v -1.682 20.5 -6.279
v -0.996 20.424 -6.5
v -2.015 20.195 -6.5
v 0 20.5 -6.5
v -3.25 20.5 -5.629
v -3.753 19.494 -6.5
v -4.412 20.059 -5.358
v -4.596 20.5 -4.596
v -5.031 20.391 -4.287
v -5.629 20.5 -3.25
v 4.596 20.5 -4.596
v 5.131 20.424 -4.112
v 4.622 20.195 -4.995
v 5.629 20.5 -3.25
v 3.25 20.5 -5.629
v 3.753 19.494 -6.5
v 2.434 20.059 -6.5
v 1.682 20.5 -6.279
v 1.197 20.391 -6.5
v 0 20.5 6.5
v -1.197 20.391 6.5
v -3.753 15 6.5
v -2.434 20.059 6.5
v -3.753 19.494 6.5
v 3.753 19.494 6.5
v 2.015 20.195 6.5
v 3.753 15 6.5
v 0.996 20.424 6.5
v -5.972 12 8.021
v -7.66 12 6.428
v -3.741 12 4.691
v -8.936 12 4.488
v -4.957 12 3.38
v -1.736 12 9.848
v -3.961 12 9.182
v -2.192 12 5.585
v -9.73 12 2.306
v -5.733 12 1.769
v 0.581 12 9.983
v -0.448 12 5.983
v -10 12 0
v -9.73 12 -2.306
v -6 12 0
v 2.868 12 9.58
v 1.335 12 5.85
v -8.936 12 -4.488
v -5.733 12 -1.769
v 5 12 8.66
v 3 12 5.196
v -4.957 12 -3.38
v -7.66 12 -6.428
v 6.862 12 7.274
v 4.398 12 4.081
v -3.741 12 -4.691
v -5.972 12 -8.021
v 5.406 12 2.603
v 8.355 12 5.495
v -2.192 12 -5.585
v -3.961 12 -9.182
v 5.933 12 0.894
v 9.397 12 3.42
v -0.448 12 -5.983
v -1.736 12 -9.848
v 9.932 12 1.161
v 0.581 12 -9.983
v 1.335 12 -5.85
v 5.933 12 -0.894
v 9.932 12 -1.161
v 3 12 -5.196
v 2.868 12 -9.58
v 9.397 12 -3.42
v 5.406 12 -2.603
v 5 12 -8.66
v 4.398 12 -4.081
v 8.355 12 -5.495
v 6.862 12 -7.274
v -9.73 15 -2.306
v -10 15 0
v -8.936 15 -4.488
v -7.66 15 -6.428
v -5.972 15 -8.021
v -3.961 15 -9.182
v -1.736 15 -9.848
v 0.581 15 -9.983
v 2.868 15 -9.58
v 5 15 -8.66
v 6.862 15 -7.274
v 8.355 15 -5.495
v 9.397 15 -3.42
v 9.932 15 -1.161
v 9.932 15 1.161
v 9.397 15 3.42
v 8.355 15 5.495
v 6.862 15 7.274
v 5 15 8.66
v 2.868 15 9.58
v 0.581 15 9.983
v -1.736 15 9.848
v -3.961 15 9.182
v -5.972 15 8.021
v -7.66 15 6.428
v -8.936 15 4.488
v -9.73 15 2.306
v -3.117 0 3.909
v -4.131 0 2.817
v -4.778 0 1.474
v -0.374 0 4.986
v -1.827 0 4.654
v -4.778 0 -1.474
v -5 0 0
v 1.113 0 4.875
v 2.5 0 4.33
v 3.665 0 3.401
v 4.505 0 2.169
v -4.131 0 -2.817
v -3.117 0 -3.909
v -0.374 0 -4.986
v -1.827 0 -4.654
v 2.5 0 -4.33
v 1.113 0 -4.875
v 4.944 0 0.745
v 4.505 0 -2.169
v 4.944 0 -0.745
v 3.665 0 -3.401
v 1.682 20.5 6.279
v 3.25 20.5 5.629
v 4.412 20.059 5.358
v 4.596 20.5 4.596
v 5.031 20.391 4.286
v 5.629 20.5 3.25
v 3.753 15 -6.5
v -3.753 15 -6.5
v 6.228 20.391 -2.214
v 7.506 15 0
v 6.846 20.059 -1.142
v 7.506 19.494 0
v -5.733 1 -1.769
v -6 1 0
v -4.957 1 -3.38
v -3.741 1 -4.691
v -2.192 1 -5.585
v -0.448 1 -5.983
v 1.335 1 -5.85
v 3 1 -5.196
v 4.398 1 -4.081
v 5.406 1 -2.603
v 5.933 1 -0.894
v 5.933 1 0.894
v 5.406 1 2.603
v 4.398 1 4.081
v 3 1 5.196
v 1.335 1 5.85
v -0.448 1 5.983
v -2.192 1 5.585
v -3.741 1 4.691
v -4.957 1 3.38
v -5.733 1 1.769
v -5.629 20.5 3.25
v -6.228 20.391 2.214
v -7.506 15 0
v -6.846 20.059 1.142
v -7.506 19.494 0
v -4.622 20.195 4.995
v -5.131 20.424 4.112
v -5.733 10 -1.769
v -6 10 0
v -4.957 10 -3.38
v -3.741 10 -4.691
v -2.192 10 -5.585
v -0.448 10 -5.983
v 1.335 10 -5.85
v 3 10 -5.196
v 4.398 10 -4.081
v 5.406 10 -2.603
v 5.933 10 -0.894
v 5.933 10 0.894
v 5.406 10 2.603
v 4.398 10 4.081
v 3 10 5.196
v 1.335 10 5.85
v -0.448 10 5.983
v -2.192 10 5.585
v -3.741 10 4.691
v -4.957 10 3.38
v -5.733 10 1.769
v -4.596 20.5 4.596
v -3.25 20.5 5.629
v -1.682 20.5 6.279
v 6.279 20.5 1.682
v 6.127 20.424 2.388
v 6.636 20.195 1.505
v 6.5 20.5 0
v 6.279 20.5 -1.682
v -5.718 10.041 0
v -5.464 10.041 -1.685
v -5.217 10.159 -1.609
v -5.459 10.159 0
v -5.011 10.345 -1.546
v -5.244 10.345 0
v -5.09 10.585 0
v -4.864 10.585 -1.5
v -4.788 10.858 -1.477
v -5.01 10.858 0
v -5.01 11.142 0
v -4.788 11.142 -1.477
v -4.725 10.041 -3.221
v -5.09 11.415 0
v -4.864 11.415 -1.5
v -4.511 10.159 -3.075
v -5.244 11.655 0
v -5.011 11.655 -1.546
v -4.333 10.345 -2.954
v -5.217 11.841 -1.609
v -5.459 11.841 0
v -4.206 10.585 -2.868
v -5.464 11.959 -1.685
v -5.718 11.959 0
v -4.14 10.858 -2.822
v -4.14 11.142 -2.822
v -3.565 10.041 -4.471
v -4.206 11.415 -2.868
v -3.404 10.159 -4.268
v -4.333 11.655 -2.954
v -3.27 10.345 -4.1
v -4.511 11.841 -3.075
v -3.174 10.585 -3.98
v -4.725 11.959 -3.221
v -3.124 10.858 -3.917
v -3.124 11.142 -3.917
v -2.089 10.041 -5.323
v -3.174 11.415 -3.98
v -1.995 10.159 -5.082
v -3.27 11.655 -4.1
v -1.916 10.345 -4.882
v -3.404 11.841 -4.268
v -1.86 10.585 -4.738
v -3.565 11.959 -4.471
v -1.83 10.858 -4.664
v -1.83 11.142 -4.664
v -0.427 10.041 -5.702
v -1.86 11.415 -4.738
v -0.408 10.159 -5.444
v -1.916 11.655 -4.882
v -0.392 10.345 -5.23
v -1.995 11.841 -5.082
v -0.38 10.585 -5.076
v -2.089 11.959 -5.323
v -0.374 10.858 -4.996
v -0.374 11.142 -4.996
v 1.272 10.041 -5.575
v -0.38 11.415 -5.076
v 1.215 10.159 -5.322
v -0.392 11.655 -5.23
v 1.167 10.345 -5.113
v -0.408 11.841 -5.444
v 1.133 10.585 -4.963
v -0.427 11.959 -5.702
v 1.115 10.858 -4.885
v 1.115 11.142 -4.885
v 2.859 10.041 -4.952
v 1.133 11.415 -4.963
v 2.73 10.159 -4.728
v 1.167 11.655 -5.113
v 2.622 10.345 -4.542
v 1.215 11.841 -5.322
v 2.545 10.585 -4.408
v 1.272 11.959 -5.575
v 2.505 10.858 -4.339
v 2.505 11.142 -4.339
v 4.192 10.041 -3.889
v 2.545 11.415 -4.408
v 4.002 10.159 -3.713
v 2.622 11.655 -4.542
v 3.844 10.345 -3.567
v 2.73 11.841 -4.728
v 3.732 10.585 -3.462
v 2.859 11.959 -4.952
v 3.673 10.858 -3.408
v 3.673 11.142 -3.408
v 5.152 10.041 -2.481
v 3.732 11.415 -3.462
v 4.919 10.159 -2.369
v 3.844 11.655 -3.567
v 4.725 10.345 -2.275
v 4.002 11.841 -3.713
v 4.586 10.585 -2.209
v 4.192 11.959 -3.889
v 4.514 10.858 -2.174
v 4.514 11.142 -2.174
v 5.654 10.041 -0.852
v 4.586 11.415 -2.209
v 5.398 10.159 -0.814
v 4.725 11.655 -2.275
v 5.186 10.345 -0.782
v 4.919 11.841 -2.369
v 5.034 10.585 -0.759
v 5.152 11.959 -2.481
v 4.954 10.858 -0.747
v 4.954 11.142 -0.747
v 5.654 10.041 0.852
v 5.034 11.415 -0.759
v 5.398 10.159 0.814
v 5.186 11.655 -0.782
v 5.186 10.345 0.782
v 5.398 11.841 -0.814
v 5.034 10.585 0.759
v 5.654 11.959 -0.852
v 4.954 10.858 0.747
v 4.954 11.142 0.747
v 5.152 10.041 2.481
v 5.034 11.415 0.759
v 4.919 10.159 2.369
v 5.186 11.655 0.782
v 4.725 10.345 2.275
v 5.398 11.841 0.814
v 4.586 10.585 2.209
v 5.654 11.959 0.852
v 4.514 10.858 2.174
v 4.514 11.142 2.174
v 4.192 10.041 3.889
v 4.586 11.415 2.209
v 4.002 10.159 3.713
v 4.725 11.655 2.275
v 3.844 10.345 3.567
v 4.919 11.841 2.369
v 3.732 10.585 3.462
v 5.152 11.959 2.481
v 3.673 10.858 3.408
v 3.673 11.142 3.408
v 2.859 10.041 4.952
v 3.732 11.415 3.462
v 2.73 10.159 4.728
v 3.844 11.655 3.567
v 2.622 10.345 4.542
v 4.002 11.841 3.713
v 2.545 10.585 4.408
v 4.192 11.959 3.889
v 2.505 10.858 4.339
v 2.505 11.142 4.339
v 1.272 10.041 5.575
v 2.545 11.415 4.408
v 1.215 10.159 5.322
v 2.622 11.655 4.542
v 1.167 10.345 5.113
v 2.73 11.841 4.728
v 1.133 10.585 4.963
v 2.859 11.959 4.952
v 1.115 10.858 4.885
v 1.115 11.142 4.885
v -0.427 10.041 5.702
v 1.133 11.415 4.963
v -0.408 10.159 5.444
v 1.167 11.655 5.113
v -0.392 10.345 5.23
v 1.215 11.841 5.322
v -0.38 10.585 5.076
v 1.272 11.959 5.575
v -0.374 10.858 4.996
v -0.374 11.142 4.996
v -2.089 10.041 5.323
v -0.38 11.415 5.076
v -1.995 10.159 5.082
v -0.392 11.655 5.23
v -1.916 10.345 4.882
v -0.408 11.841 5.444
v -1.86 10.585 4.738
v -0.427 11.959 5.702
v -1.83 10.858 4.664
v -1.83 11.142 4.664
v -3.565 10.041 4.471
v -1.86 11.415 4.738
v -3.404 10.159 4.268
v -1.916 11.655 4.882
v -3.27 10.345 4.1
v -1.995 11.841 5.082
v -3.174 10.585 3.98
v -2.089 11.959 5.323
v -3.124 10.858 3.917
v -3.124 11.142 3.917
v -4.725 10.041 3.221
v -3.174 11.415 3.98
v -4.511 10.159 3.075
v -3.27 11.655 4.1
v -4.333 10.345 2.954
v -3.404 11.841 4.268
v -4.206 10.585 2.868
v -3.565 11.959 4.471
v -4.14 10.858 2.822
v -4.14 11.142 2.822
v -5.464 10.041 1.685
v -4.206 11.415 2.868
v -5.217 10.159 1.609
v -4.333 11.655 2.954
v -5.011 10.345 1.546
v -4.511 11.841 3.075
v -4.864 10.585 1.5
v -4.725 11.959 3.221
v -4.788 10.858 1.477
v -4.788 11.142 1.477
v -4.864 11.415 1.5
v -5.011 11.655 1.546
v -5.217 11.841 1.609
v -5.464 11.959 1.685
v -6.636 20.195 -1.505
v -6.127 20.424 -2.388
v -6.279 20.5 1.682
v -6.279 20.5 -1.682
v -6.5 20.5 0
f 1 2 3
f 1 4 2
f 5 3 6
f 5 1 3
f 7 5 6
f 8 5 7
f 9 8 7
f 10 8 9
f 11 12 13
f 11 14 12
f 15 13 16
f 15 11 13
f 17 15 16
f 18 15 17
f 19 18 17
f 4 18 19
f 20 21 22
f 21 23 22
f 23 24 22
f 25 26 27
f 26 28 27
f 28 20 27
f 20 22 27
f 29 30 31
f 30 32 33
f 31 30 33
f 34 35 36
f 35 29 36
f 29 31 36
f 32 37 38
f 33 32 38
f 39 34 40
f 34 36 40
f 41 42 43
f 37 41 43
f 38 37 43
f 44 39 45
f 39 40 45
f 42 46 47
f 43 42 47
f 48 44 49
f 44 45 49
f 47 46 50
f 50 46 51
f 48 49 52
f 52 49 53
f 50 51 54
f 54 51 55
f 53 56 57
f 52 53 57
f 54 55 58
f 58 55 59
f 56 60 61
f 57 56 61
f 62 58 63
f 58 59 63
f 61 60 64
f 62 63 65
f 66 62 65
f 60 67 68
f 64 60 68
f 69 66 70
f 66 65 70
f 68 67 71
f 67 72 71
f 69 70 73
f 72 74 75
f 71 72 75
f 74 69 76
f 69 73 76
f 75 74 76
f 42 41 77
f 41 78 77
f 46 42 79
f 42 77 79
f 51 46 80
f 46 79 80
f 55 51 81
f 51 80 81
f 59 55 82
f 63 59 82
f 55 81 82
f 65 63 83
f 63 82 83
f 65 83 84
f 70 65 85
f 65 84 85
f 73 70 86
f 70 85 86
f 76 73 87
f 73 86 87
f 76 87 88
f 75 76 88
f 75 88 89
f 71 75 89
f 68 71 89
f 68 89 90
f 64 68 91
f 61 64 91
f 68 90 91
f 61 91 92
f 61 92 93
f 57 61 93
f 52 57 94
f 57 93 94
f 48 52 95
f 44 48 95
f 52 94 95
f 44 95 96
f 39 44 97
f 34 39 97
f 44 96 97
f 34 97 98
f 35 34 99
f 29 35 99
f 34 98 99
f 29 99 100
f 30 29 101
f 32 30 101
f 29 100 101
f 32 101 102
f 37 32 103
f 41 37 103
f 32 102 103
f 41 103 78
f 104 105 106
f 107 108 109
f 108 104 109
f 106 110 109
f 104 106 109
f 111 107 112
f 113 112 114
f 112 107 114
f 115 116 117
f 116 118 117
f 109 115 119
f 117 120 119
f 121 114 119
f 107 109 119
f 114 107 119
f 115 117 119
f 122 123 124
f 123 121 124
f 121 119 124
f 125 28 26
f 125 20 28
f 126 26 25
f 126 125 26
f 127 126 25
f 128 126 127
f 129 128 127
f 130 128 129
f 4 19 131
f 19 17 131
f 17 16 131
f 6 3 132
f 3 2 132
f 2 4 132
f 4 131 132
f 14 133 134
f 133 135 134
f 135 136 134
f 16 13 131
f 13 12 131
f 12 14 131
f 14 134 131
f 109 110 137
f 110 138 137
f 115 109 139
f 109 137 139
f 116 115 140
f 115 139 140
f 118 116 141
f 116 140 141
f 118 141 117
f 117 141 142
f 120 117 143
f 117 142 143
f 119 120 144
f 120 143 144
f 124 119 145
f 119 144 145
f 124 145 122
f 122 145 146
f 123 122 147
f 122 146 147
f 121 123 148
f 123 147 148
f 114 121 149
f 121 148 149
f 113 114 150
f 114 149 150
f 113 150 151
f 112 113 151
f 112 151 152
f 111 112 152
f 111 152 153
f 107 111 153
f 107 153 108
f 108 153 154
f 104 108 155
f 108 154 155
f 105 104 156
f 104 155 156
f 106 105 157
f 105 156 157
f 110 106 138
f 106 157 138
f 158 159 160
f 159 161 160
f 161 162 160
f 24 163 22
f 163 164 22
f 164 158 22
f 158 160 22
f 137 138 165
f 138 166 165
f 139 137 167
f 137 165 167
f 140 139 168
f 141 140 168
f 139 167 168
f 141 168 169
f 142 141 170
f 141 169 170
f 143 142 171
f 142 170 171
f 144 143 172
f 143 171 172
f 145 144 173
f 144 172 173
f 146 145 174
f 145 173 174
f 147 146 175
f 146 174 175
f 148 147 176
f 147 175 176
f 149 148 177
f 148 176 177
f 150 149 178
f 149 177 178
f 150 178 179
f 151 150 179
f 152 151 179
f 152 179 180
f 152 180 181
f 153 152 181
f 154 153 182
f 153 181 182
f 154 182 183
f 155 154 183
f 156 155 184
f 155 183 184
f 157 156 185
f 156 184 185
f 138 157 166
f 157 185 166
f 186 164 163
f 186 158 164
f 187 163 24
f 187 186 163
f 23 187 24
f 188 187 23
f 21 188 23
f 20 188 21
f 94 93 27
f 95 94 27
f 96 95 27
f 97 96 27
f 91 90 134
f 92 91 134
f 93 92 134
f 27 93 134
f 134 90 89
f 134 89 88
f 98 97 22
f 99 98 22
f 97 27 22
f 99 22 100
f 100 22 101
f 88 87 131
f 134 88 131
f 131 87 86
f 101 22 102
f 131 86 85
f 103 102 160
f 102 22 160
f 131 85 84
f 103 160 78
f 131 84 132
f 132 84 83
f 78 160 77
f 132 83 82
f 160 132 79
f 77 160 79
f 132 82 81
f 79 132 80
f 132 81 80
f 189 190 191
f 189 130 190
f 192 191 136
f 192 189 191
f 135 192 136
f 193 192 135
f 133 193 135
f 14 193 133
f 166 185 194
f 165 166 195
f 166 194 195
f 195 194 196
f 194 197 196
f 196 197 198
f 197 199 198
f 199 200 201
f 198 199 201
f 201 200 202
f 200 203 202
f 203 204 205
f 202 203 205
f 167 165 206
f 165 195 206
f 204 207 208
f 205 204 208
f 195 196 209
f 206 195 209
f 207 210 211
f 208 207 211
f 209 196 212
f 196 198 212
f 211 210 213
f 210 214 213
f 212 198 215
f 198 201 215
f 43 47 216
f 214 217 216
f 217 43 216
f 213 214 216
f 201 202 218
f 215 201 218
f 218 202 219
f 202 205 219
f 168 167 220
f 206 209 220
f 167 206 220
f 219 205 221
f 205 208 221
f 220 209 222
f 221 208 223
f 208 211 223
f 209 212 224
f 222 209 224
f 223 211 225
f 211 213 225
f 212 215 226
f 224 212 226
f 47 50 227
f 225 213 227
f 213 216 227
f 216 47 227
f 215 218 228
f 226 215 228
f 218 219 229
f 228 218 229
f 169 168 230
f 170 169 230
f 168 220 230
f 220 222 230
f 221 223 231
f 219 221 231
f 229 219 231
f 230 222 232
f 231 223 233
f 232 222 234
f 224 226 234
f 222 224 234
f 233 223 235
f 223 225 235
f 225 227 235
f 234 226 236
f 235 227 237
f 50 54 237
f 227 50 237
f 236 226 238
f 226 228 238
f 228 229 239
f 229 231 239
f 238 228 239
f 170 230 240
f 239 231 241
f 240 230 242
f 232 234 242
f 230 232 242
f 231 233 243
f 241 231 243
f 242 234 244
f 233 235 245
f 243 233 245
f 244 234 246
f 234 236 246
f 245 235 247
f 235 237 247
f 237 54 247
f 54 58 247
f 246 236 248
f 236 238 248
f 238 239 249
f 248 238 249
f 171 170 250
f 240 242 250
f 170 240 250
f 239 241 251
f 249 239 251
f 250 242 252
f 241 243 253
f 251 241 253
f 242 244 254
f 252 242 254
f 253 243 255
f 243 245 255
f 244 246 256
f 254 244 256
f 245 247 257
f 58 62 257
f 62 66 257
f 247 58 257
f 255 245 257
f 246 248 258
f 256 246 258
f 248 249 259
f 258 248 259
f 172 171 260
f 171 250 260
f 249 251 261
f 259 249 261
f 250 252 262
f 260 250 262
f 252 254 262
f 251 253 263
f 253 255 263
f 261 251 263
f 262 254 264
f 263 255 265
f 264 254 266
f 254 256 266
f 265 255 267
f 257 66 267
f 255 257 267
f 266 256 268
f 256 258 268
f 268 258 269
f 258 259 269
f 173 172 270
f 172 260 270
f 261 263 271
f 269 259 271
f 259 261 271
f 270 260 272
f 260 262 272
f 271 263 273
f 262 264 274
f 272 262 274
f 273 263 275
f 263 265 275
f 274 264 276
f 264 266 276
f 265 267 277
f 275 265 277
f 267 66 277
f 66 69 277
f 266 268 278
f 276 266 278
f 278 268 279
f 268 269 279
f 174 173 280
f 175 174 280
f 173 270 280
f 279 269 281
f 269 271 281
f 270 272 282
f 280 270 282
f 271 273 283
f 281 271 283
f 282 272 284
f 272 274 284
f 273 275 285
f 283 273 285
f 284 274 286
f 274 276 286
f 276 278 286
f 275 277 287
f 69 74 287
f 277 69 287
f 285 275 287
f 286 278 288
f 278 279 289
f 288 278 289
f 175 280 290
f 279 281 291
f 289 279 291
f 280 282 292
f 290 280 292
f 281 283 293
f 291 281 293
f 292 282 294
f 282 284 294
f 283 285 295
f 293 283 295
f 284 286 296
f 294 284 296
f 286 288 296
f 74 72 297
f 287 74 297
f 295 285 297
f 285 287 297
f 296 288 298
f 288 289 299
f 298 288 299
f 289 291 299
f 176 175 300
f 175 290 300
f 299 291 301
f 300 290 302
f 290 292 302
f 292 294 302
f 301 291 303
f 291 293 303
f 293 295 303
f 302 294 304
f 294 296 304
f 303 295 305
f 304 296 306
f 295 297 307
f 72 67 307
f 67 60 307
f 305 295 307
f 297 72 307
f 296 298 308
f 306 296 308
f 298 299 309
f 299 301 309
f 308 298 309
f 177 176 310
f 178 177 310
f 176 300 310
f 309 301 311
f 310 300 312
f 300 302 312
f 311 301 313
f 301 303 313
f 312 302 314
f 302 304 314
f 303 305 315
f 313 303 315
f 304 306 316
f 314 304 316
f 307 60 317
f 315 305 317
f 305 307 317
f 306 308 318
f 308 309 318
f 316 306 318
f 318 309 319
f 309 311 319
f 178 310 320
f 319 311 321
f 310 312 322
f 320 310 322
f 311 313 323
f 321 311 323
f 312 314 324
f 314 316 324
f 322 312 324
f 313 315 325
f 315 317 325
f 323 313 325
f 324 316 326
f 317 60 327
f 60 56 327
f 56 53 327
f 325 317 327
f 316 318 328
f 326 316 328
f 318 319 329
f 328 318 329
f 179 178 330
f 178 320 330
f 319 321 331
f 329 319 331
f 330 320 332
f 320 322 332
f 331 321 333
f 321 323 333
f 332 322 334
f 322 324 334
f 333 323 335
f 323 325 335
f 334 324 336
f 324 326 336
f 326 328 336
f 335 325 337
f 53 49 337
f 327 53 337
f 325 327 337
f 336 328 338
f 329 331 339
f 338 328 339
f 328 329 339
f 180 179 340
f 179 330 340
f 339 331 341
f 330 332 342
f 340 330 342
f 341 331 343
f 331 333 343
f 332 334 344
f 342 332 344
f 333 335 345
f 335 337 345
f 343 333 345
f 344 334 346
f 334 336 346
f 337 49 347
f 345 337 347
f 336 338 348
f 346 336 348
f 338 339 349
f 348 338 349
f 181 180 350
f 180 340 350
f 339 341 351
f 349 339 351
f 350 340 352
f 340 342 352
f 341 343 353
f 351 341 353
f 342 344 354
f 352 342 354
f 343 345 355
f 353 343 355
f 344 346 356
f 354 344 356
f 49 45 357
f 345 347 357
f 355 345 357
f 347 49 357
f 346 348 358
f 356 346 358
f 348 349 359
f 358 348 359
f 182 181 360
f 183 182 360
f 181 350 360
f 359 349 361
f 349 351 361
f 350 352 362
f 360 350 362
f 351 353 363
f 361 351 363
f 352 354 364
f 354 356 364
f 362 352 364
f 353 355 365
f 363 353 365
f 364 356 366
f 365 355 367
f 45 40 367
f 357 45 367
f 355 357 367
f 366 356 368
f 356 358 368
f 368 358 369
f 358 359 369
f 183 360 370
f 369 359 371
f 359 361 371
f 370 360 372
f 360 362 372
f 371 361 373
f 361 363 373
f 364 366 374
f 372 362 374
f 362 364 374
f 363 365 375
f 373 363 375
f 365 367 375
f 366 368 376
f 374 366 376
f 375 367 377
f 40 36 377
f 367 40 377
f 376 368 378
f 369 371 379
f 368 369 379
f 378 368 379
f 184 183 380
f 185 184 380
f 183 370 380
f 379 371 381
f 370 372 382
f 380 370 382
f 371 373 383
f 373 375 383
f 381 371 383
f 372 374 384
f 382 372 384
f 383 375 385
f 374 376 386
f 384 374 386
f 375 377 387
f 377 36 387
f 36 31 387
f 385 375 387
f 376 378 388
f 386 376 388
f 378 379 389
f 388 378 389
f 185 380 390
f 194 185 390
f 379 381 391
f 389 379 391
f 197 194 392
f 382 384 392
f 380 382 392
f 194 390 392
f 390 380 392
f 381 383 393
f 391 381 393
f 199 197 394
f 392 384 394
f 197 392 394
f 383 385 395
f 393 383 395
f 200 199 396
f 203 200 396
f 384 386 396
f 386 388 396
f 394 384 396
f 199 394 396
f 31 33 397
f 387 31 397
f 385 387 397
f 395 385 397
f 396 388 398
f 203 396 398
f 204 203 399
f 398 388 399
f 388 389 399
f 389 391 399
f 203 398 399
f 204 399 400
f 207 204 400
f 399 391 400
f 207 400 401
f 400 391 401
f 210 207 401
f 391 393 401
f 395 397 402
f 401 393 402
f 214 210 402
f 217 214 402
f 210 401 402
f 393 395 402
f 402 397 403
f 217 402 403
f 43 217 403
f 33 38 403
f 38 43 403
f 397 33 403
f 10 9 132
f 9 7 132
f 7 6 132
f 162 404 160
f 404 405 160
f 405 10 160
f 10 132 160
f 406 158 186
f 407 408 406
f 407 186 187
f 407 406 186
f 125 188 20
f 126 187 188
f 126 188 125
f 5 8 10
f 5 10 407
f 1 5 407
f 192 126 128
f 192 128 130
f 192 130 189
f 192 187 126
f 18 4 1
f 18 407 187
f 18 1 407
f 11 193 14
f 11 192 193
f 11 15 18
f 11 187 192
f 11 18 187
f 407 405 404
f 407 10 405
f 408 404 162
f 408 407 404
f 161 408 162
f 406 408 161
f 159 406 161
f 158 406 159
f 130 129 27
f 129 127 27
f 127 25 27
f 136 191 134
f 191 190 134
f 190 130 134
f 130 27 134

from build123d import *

# Parameters (mm, degrees)
BOSS_EXTRUDE1_DEPTH = 5.5
SKETCH3_OUTSIDE_W   = 39.986
SKETCH3_OUTSIDE_H   = 39.986
SKETCH3_OUTSIDE_R   = 6.5
CUT_EXTRUDE1_DEPTH  = 5.5
CUT_EXTRUDE1_DRAFT  = -45


with BuildPart() as part:
    # Sketch1 → Revolve1 (revolve)
    with BuildSketch(Plane.XY):
        with BuildLine():
            Line((0, 0), (-5, 0))
            Line((-5, 0), (-6, 1))
            Line((-6, 1), (-6, 10))
            ThreePointArc((-6, 10), (-5, 11), (-6, 12))
            Line((-6, 12), (-10, 12))
            Line((-10, 12), (-10, 15))
            Line((-10, 15), (0, 15))
            Line((0, 15), (0, 0))
        make_face()
    revolve(axis=Axis((0, 15, 0), (0, -1, 0)))

    # Sketch2 → Boss-Extrude1 (add)
    with BuildSketch(Plane(origin=(0, 15, 0), x_dir=(1, 0, 0), z_dir=(0, 1, 0))):
        Polygon((-3.75277675, 6.5), (-7.505553499, 0), (-3.75277675, -6.5), (3.75277675, -6.5), (7.505553499, 0), (3.75277675, 6.5), align=None)
    extrude(amount=BOSS_EXTRUDE1_DEPTH)


with BuildPart() as cut_extrude1_tool:
    # Sketch3 outside → Cut-Extrude1 (with draft: the straight prism first)
    with BuildSketch(Plane(origin=(0, 20.5, 0), x_dir=(1, 0, 0), z_dir=(0, 1, 0))):
        Rectangle(SKETCH3_OUTSIDE_W, SKETCH3_OUTSIDE_H)
        Circle(SKETCH3_OUTSIDE_R, mode=Mode.SUBTRACT)
    extrude(amount=-CUT_EXTRUDE1_DEPTH)
    # Cut-Extrude1: the draft: its side faces are tilted about the plane it starts from
    cut_extrude1_sides = [cut_extrude1_tool.faces().sort_by_distance(p)[0] for p in [
        (0, 17.75, 19.993),
        (19.993, 17.75, 0),
        (0, 17.75, -19.993),
        (-19.993, 17.75, 0),
        (-6.5, 17.75, 0),
    ]]
    draft(cut_extrude1_sides, Plane(origin=(0, 20.5, 0), x_dir=(1, 0, 0), z_dir=(0, 1, 0)), CUT_EXTRUDE1_DRAFT)


with BuildPart() as part_1:
    add(part.part)

    # Cut-Extrude1: cut by cut_extrude1_tool
    add(cut_extrude1_tool.part, mode=Mode.SUBTRACT)


solid = part_1.part
